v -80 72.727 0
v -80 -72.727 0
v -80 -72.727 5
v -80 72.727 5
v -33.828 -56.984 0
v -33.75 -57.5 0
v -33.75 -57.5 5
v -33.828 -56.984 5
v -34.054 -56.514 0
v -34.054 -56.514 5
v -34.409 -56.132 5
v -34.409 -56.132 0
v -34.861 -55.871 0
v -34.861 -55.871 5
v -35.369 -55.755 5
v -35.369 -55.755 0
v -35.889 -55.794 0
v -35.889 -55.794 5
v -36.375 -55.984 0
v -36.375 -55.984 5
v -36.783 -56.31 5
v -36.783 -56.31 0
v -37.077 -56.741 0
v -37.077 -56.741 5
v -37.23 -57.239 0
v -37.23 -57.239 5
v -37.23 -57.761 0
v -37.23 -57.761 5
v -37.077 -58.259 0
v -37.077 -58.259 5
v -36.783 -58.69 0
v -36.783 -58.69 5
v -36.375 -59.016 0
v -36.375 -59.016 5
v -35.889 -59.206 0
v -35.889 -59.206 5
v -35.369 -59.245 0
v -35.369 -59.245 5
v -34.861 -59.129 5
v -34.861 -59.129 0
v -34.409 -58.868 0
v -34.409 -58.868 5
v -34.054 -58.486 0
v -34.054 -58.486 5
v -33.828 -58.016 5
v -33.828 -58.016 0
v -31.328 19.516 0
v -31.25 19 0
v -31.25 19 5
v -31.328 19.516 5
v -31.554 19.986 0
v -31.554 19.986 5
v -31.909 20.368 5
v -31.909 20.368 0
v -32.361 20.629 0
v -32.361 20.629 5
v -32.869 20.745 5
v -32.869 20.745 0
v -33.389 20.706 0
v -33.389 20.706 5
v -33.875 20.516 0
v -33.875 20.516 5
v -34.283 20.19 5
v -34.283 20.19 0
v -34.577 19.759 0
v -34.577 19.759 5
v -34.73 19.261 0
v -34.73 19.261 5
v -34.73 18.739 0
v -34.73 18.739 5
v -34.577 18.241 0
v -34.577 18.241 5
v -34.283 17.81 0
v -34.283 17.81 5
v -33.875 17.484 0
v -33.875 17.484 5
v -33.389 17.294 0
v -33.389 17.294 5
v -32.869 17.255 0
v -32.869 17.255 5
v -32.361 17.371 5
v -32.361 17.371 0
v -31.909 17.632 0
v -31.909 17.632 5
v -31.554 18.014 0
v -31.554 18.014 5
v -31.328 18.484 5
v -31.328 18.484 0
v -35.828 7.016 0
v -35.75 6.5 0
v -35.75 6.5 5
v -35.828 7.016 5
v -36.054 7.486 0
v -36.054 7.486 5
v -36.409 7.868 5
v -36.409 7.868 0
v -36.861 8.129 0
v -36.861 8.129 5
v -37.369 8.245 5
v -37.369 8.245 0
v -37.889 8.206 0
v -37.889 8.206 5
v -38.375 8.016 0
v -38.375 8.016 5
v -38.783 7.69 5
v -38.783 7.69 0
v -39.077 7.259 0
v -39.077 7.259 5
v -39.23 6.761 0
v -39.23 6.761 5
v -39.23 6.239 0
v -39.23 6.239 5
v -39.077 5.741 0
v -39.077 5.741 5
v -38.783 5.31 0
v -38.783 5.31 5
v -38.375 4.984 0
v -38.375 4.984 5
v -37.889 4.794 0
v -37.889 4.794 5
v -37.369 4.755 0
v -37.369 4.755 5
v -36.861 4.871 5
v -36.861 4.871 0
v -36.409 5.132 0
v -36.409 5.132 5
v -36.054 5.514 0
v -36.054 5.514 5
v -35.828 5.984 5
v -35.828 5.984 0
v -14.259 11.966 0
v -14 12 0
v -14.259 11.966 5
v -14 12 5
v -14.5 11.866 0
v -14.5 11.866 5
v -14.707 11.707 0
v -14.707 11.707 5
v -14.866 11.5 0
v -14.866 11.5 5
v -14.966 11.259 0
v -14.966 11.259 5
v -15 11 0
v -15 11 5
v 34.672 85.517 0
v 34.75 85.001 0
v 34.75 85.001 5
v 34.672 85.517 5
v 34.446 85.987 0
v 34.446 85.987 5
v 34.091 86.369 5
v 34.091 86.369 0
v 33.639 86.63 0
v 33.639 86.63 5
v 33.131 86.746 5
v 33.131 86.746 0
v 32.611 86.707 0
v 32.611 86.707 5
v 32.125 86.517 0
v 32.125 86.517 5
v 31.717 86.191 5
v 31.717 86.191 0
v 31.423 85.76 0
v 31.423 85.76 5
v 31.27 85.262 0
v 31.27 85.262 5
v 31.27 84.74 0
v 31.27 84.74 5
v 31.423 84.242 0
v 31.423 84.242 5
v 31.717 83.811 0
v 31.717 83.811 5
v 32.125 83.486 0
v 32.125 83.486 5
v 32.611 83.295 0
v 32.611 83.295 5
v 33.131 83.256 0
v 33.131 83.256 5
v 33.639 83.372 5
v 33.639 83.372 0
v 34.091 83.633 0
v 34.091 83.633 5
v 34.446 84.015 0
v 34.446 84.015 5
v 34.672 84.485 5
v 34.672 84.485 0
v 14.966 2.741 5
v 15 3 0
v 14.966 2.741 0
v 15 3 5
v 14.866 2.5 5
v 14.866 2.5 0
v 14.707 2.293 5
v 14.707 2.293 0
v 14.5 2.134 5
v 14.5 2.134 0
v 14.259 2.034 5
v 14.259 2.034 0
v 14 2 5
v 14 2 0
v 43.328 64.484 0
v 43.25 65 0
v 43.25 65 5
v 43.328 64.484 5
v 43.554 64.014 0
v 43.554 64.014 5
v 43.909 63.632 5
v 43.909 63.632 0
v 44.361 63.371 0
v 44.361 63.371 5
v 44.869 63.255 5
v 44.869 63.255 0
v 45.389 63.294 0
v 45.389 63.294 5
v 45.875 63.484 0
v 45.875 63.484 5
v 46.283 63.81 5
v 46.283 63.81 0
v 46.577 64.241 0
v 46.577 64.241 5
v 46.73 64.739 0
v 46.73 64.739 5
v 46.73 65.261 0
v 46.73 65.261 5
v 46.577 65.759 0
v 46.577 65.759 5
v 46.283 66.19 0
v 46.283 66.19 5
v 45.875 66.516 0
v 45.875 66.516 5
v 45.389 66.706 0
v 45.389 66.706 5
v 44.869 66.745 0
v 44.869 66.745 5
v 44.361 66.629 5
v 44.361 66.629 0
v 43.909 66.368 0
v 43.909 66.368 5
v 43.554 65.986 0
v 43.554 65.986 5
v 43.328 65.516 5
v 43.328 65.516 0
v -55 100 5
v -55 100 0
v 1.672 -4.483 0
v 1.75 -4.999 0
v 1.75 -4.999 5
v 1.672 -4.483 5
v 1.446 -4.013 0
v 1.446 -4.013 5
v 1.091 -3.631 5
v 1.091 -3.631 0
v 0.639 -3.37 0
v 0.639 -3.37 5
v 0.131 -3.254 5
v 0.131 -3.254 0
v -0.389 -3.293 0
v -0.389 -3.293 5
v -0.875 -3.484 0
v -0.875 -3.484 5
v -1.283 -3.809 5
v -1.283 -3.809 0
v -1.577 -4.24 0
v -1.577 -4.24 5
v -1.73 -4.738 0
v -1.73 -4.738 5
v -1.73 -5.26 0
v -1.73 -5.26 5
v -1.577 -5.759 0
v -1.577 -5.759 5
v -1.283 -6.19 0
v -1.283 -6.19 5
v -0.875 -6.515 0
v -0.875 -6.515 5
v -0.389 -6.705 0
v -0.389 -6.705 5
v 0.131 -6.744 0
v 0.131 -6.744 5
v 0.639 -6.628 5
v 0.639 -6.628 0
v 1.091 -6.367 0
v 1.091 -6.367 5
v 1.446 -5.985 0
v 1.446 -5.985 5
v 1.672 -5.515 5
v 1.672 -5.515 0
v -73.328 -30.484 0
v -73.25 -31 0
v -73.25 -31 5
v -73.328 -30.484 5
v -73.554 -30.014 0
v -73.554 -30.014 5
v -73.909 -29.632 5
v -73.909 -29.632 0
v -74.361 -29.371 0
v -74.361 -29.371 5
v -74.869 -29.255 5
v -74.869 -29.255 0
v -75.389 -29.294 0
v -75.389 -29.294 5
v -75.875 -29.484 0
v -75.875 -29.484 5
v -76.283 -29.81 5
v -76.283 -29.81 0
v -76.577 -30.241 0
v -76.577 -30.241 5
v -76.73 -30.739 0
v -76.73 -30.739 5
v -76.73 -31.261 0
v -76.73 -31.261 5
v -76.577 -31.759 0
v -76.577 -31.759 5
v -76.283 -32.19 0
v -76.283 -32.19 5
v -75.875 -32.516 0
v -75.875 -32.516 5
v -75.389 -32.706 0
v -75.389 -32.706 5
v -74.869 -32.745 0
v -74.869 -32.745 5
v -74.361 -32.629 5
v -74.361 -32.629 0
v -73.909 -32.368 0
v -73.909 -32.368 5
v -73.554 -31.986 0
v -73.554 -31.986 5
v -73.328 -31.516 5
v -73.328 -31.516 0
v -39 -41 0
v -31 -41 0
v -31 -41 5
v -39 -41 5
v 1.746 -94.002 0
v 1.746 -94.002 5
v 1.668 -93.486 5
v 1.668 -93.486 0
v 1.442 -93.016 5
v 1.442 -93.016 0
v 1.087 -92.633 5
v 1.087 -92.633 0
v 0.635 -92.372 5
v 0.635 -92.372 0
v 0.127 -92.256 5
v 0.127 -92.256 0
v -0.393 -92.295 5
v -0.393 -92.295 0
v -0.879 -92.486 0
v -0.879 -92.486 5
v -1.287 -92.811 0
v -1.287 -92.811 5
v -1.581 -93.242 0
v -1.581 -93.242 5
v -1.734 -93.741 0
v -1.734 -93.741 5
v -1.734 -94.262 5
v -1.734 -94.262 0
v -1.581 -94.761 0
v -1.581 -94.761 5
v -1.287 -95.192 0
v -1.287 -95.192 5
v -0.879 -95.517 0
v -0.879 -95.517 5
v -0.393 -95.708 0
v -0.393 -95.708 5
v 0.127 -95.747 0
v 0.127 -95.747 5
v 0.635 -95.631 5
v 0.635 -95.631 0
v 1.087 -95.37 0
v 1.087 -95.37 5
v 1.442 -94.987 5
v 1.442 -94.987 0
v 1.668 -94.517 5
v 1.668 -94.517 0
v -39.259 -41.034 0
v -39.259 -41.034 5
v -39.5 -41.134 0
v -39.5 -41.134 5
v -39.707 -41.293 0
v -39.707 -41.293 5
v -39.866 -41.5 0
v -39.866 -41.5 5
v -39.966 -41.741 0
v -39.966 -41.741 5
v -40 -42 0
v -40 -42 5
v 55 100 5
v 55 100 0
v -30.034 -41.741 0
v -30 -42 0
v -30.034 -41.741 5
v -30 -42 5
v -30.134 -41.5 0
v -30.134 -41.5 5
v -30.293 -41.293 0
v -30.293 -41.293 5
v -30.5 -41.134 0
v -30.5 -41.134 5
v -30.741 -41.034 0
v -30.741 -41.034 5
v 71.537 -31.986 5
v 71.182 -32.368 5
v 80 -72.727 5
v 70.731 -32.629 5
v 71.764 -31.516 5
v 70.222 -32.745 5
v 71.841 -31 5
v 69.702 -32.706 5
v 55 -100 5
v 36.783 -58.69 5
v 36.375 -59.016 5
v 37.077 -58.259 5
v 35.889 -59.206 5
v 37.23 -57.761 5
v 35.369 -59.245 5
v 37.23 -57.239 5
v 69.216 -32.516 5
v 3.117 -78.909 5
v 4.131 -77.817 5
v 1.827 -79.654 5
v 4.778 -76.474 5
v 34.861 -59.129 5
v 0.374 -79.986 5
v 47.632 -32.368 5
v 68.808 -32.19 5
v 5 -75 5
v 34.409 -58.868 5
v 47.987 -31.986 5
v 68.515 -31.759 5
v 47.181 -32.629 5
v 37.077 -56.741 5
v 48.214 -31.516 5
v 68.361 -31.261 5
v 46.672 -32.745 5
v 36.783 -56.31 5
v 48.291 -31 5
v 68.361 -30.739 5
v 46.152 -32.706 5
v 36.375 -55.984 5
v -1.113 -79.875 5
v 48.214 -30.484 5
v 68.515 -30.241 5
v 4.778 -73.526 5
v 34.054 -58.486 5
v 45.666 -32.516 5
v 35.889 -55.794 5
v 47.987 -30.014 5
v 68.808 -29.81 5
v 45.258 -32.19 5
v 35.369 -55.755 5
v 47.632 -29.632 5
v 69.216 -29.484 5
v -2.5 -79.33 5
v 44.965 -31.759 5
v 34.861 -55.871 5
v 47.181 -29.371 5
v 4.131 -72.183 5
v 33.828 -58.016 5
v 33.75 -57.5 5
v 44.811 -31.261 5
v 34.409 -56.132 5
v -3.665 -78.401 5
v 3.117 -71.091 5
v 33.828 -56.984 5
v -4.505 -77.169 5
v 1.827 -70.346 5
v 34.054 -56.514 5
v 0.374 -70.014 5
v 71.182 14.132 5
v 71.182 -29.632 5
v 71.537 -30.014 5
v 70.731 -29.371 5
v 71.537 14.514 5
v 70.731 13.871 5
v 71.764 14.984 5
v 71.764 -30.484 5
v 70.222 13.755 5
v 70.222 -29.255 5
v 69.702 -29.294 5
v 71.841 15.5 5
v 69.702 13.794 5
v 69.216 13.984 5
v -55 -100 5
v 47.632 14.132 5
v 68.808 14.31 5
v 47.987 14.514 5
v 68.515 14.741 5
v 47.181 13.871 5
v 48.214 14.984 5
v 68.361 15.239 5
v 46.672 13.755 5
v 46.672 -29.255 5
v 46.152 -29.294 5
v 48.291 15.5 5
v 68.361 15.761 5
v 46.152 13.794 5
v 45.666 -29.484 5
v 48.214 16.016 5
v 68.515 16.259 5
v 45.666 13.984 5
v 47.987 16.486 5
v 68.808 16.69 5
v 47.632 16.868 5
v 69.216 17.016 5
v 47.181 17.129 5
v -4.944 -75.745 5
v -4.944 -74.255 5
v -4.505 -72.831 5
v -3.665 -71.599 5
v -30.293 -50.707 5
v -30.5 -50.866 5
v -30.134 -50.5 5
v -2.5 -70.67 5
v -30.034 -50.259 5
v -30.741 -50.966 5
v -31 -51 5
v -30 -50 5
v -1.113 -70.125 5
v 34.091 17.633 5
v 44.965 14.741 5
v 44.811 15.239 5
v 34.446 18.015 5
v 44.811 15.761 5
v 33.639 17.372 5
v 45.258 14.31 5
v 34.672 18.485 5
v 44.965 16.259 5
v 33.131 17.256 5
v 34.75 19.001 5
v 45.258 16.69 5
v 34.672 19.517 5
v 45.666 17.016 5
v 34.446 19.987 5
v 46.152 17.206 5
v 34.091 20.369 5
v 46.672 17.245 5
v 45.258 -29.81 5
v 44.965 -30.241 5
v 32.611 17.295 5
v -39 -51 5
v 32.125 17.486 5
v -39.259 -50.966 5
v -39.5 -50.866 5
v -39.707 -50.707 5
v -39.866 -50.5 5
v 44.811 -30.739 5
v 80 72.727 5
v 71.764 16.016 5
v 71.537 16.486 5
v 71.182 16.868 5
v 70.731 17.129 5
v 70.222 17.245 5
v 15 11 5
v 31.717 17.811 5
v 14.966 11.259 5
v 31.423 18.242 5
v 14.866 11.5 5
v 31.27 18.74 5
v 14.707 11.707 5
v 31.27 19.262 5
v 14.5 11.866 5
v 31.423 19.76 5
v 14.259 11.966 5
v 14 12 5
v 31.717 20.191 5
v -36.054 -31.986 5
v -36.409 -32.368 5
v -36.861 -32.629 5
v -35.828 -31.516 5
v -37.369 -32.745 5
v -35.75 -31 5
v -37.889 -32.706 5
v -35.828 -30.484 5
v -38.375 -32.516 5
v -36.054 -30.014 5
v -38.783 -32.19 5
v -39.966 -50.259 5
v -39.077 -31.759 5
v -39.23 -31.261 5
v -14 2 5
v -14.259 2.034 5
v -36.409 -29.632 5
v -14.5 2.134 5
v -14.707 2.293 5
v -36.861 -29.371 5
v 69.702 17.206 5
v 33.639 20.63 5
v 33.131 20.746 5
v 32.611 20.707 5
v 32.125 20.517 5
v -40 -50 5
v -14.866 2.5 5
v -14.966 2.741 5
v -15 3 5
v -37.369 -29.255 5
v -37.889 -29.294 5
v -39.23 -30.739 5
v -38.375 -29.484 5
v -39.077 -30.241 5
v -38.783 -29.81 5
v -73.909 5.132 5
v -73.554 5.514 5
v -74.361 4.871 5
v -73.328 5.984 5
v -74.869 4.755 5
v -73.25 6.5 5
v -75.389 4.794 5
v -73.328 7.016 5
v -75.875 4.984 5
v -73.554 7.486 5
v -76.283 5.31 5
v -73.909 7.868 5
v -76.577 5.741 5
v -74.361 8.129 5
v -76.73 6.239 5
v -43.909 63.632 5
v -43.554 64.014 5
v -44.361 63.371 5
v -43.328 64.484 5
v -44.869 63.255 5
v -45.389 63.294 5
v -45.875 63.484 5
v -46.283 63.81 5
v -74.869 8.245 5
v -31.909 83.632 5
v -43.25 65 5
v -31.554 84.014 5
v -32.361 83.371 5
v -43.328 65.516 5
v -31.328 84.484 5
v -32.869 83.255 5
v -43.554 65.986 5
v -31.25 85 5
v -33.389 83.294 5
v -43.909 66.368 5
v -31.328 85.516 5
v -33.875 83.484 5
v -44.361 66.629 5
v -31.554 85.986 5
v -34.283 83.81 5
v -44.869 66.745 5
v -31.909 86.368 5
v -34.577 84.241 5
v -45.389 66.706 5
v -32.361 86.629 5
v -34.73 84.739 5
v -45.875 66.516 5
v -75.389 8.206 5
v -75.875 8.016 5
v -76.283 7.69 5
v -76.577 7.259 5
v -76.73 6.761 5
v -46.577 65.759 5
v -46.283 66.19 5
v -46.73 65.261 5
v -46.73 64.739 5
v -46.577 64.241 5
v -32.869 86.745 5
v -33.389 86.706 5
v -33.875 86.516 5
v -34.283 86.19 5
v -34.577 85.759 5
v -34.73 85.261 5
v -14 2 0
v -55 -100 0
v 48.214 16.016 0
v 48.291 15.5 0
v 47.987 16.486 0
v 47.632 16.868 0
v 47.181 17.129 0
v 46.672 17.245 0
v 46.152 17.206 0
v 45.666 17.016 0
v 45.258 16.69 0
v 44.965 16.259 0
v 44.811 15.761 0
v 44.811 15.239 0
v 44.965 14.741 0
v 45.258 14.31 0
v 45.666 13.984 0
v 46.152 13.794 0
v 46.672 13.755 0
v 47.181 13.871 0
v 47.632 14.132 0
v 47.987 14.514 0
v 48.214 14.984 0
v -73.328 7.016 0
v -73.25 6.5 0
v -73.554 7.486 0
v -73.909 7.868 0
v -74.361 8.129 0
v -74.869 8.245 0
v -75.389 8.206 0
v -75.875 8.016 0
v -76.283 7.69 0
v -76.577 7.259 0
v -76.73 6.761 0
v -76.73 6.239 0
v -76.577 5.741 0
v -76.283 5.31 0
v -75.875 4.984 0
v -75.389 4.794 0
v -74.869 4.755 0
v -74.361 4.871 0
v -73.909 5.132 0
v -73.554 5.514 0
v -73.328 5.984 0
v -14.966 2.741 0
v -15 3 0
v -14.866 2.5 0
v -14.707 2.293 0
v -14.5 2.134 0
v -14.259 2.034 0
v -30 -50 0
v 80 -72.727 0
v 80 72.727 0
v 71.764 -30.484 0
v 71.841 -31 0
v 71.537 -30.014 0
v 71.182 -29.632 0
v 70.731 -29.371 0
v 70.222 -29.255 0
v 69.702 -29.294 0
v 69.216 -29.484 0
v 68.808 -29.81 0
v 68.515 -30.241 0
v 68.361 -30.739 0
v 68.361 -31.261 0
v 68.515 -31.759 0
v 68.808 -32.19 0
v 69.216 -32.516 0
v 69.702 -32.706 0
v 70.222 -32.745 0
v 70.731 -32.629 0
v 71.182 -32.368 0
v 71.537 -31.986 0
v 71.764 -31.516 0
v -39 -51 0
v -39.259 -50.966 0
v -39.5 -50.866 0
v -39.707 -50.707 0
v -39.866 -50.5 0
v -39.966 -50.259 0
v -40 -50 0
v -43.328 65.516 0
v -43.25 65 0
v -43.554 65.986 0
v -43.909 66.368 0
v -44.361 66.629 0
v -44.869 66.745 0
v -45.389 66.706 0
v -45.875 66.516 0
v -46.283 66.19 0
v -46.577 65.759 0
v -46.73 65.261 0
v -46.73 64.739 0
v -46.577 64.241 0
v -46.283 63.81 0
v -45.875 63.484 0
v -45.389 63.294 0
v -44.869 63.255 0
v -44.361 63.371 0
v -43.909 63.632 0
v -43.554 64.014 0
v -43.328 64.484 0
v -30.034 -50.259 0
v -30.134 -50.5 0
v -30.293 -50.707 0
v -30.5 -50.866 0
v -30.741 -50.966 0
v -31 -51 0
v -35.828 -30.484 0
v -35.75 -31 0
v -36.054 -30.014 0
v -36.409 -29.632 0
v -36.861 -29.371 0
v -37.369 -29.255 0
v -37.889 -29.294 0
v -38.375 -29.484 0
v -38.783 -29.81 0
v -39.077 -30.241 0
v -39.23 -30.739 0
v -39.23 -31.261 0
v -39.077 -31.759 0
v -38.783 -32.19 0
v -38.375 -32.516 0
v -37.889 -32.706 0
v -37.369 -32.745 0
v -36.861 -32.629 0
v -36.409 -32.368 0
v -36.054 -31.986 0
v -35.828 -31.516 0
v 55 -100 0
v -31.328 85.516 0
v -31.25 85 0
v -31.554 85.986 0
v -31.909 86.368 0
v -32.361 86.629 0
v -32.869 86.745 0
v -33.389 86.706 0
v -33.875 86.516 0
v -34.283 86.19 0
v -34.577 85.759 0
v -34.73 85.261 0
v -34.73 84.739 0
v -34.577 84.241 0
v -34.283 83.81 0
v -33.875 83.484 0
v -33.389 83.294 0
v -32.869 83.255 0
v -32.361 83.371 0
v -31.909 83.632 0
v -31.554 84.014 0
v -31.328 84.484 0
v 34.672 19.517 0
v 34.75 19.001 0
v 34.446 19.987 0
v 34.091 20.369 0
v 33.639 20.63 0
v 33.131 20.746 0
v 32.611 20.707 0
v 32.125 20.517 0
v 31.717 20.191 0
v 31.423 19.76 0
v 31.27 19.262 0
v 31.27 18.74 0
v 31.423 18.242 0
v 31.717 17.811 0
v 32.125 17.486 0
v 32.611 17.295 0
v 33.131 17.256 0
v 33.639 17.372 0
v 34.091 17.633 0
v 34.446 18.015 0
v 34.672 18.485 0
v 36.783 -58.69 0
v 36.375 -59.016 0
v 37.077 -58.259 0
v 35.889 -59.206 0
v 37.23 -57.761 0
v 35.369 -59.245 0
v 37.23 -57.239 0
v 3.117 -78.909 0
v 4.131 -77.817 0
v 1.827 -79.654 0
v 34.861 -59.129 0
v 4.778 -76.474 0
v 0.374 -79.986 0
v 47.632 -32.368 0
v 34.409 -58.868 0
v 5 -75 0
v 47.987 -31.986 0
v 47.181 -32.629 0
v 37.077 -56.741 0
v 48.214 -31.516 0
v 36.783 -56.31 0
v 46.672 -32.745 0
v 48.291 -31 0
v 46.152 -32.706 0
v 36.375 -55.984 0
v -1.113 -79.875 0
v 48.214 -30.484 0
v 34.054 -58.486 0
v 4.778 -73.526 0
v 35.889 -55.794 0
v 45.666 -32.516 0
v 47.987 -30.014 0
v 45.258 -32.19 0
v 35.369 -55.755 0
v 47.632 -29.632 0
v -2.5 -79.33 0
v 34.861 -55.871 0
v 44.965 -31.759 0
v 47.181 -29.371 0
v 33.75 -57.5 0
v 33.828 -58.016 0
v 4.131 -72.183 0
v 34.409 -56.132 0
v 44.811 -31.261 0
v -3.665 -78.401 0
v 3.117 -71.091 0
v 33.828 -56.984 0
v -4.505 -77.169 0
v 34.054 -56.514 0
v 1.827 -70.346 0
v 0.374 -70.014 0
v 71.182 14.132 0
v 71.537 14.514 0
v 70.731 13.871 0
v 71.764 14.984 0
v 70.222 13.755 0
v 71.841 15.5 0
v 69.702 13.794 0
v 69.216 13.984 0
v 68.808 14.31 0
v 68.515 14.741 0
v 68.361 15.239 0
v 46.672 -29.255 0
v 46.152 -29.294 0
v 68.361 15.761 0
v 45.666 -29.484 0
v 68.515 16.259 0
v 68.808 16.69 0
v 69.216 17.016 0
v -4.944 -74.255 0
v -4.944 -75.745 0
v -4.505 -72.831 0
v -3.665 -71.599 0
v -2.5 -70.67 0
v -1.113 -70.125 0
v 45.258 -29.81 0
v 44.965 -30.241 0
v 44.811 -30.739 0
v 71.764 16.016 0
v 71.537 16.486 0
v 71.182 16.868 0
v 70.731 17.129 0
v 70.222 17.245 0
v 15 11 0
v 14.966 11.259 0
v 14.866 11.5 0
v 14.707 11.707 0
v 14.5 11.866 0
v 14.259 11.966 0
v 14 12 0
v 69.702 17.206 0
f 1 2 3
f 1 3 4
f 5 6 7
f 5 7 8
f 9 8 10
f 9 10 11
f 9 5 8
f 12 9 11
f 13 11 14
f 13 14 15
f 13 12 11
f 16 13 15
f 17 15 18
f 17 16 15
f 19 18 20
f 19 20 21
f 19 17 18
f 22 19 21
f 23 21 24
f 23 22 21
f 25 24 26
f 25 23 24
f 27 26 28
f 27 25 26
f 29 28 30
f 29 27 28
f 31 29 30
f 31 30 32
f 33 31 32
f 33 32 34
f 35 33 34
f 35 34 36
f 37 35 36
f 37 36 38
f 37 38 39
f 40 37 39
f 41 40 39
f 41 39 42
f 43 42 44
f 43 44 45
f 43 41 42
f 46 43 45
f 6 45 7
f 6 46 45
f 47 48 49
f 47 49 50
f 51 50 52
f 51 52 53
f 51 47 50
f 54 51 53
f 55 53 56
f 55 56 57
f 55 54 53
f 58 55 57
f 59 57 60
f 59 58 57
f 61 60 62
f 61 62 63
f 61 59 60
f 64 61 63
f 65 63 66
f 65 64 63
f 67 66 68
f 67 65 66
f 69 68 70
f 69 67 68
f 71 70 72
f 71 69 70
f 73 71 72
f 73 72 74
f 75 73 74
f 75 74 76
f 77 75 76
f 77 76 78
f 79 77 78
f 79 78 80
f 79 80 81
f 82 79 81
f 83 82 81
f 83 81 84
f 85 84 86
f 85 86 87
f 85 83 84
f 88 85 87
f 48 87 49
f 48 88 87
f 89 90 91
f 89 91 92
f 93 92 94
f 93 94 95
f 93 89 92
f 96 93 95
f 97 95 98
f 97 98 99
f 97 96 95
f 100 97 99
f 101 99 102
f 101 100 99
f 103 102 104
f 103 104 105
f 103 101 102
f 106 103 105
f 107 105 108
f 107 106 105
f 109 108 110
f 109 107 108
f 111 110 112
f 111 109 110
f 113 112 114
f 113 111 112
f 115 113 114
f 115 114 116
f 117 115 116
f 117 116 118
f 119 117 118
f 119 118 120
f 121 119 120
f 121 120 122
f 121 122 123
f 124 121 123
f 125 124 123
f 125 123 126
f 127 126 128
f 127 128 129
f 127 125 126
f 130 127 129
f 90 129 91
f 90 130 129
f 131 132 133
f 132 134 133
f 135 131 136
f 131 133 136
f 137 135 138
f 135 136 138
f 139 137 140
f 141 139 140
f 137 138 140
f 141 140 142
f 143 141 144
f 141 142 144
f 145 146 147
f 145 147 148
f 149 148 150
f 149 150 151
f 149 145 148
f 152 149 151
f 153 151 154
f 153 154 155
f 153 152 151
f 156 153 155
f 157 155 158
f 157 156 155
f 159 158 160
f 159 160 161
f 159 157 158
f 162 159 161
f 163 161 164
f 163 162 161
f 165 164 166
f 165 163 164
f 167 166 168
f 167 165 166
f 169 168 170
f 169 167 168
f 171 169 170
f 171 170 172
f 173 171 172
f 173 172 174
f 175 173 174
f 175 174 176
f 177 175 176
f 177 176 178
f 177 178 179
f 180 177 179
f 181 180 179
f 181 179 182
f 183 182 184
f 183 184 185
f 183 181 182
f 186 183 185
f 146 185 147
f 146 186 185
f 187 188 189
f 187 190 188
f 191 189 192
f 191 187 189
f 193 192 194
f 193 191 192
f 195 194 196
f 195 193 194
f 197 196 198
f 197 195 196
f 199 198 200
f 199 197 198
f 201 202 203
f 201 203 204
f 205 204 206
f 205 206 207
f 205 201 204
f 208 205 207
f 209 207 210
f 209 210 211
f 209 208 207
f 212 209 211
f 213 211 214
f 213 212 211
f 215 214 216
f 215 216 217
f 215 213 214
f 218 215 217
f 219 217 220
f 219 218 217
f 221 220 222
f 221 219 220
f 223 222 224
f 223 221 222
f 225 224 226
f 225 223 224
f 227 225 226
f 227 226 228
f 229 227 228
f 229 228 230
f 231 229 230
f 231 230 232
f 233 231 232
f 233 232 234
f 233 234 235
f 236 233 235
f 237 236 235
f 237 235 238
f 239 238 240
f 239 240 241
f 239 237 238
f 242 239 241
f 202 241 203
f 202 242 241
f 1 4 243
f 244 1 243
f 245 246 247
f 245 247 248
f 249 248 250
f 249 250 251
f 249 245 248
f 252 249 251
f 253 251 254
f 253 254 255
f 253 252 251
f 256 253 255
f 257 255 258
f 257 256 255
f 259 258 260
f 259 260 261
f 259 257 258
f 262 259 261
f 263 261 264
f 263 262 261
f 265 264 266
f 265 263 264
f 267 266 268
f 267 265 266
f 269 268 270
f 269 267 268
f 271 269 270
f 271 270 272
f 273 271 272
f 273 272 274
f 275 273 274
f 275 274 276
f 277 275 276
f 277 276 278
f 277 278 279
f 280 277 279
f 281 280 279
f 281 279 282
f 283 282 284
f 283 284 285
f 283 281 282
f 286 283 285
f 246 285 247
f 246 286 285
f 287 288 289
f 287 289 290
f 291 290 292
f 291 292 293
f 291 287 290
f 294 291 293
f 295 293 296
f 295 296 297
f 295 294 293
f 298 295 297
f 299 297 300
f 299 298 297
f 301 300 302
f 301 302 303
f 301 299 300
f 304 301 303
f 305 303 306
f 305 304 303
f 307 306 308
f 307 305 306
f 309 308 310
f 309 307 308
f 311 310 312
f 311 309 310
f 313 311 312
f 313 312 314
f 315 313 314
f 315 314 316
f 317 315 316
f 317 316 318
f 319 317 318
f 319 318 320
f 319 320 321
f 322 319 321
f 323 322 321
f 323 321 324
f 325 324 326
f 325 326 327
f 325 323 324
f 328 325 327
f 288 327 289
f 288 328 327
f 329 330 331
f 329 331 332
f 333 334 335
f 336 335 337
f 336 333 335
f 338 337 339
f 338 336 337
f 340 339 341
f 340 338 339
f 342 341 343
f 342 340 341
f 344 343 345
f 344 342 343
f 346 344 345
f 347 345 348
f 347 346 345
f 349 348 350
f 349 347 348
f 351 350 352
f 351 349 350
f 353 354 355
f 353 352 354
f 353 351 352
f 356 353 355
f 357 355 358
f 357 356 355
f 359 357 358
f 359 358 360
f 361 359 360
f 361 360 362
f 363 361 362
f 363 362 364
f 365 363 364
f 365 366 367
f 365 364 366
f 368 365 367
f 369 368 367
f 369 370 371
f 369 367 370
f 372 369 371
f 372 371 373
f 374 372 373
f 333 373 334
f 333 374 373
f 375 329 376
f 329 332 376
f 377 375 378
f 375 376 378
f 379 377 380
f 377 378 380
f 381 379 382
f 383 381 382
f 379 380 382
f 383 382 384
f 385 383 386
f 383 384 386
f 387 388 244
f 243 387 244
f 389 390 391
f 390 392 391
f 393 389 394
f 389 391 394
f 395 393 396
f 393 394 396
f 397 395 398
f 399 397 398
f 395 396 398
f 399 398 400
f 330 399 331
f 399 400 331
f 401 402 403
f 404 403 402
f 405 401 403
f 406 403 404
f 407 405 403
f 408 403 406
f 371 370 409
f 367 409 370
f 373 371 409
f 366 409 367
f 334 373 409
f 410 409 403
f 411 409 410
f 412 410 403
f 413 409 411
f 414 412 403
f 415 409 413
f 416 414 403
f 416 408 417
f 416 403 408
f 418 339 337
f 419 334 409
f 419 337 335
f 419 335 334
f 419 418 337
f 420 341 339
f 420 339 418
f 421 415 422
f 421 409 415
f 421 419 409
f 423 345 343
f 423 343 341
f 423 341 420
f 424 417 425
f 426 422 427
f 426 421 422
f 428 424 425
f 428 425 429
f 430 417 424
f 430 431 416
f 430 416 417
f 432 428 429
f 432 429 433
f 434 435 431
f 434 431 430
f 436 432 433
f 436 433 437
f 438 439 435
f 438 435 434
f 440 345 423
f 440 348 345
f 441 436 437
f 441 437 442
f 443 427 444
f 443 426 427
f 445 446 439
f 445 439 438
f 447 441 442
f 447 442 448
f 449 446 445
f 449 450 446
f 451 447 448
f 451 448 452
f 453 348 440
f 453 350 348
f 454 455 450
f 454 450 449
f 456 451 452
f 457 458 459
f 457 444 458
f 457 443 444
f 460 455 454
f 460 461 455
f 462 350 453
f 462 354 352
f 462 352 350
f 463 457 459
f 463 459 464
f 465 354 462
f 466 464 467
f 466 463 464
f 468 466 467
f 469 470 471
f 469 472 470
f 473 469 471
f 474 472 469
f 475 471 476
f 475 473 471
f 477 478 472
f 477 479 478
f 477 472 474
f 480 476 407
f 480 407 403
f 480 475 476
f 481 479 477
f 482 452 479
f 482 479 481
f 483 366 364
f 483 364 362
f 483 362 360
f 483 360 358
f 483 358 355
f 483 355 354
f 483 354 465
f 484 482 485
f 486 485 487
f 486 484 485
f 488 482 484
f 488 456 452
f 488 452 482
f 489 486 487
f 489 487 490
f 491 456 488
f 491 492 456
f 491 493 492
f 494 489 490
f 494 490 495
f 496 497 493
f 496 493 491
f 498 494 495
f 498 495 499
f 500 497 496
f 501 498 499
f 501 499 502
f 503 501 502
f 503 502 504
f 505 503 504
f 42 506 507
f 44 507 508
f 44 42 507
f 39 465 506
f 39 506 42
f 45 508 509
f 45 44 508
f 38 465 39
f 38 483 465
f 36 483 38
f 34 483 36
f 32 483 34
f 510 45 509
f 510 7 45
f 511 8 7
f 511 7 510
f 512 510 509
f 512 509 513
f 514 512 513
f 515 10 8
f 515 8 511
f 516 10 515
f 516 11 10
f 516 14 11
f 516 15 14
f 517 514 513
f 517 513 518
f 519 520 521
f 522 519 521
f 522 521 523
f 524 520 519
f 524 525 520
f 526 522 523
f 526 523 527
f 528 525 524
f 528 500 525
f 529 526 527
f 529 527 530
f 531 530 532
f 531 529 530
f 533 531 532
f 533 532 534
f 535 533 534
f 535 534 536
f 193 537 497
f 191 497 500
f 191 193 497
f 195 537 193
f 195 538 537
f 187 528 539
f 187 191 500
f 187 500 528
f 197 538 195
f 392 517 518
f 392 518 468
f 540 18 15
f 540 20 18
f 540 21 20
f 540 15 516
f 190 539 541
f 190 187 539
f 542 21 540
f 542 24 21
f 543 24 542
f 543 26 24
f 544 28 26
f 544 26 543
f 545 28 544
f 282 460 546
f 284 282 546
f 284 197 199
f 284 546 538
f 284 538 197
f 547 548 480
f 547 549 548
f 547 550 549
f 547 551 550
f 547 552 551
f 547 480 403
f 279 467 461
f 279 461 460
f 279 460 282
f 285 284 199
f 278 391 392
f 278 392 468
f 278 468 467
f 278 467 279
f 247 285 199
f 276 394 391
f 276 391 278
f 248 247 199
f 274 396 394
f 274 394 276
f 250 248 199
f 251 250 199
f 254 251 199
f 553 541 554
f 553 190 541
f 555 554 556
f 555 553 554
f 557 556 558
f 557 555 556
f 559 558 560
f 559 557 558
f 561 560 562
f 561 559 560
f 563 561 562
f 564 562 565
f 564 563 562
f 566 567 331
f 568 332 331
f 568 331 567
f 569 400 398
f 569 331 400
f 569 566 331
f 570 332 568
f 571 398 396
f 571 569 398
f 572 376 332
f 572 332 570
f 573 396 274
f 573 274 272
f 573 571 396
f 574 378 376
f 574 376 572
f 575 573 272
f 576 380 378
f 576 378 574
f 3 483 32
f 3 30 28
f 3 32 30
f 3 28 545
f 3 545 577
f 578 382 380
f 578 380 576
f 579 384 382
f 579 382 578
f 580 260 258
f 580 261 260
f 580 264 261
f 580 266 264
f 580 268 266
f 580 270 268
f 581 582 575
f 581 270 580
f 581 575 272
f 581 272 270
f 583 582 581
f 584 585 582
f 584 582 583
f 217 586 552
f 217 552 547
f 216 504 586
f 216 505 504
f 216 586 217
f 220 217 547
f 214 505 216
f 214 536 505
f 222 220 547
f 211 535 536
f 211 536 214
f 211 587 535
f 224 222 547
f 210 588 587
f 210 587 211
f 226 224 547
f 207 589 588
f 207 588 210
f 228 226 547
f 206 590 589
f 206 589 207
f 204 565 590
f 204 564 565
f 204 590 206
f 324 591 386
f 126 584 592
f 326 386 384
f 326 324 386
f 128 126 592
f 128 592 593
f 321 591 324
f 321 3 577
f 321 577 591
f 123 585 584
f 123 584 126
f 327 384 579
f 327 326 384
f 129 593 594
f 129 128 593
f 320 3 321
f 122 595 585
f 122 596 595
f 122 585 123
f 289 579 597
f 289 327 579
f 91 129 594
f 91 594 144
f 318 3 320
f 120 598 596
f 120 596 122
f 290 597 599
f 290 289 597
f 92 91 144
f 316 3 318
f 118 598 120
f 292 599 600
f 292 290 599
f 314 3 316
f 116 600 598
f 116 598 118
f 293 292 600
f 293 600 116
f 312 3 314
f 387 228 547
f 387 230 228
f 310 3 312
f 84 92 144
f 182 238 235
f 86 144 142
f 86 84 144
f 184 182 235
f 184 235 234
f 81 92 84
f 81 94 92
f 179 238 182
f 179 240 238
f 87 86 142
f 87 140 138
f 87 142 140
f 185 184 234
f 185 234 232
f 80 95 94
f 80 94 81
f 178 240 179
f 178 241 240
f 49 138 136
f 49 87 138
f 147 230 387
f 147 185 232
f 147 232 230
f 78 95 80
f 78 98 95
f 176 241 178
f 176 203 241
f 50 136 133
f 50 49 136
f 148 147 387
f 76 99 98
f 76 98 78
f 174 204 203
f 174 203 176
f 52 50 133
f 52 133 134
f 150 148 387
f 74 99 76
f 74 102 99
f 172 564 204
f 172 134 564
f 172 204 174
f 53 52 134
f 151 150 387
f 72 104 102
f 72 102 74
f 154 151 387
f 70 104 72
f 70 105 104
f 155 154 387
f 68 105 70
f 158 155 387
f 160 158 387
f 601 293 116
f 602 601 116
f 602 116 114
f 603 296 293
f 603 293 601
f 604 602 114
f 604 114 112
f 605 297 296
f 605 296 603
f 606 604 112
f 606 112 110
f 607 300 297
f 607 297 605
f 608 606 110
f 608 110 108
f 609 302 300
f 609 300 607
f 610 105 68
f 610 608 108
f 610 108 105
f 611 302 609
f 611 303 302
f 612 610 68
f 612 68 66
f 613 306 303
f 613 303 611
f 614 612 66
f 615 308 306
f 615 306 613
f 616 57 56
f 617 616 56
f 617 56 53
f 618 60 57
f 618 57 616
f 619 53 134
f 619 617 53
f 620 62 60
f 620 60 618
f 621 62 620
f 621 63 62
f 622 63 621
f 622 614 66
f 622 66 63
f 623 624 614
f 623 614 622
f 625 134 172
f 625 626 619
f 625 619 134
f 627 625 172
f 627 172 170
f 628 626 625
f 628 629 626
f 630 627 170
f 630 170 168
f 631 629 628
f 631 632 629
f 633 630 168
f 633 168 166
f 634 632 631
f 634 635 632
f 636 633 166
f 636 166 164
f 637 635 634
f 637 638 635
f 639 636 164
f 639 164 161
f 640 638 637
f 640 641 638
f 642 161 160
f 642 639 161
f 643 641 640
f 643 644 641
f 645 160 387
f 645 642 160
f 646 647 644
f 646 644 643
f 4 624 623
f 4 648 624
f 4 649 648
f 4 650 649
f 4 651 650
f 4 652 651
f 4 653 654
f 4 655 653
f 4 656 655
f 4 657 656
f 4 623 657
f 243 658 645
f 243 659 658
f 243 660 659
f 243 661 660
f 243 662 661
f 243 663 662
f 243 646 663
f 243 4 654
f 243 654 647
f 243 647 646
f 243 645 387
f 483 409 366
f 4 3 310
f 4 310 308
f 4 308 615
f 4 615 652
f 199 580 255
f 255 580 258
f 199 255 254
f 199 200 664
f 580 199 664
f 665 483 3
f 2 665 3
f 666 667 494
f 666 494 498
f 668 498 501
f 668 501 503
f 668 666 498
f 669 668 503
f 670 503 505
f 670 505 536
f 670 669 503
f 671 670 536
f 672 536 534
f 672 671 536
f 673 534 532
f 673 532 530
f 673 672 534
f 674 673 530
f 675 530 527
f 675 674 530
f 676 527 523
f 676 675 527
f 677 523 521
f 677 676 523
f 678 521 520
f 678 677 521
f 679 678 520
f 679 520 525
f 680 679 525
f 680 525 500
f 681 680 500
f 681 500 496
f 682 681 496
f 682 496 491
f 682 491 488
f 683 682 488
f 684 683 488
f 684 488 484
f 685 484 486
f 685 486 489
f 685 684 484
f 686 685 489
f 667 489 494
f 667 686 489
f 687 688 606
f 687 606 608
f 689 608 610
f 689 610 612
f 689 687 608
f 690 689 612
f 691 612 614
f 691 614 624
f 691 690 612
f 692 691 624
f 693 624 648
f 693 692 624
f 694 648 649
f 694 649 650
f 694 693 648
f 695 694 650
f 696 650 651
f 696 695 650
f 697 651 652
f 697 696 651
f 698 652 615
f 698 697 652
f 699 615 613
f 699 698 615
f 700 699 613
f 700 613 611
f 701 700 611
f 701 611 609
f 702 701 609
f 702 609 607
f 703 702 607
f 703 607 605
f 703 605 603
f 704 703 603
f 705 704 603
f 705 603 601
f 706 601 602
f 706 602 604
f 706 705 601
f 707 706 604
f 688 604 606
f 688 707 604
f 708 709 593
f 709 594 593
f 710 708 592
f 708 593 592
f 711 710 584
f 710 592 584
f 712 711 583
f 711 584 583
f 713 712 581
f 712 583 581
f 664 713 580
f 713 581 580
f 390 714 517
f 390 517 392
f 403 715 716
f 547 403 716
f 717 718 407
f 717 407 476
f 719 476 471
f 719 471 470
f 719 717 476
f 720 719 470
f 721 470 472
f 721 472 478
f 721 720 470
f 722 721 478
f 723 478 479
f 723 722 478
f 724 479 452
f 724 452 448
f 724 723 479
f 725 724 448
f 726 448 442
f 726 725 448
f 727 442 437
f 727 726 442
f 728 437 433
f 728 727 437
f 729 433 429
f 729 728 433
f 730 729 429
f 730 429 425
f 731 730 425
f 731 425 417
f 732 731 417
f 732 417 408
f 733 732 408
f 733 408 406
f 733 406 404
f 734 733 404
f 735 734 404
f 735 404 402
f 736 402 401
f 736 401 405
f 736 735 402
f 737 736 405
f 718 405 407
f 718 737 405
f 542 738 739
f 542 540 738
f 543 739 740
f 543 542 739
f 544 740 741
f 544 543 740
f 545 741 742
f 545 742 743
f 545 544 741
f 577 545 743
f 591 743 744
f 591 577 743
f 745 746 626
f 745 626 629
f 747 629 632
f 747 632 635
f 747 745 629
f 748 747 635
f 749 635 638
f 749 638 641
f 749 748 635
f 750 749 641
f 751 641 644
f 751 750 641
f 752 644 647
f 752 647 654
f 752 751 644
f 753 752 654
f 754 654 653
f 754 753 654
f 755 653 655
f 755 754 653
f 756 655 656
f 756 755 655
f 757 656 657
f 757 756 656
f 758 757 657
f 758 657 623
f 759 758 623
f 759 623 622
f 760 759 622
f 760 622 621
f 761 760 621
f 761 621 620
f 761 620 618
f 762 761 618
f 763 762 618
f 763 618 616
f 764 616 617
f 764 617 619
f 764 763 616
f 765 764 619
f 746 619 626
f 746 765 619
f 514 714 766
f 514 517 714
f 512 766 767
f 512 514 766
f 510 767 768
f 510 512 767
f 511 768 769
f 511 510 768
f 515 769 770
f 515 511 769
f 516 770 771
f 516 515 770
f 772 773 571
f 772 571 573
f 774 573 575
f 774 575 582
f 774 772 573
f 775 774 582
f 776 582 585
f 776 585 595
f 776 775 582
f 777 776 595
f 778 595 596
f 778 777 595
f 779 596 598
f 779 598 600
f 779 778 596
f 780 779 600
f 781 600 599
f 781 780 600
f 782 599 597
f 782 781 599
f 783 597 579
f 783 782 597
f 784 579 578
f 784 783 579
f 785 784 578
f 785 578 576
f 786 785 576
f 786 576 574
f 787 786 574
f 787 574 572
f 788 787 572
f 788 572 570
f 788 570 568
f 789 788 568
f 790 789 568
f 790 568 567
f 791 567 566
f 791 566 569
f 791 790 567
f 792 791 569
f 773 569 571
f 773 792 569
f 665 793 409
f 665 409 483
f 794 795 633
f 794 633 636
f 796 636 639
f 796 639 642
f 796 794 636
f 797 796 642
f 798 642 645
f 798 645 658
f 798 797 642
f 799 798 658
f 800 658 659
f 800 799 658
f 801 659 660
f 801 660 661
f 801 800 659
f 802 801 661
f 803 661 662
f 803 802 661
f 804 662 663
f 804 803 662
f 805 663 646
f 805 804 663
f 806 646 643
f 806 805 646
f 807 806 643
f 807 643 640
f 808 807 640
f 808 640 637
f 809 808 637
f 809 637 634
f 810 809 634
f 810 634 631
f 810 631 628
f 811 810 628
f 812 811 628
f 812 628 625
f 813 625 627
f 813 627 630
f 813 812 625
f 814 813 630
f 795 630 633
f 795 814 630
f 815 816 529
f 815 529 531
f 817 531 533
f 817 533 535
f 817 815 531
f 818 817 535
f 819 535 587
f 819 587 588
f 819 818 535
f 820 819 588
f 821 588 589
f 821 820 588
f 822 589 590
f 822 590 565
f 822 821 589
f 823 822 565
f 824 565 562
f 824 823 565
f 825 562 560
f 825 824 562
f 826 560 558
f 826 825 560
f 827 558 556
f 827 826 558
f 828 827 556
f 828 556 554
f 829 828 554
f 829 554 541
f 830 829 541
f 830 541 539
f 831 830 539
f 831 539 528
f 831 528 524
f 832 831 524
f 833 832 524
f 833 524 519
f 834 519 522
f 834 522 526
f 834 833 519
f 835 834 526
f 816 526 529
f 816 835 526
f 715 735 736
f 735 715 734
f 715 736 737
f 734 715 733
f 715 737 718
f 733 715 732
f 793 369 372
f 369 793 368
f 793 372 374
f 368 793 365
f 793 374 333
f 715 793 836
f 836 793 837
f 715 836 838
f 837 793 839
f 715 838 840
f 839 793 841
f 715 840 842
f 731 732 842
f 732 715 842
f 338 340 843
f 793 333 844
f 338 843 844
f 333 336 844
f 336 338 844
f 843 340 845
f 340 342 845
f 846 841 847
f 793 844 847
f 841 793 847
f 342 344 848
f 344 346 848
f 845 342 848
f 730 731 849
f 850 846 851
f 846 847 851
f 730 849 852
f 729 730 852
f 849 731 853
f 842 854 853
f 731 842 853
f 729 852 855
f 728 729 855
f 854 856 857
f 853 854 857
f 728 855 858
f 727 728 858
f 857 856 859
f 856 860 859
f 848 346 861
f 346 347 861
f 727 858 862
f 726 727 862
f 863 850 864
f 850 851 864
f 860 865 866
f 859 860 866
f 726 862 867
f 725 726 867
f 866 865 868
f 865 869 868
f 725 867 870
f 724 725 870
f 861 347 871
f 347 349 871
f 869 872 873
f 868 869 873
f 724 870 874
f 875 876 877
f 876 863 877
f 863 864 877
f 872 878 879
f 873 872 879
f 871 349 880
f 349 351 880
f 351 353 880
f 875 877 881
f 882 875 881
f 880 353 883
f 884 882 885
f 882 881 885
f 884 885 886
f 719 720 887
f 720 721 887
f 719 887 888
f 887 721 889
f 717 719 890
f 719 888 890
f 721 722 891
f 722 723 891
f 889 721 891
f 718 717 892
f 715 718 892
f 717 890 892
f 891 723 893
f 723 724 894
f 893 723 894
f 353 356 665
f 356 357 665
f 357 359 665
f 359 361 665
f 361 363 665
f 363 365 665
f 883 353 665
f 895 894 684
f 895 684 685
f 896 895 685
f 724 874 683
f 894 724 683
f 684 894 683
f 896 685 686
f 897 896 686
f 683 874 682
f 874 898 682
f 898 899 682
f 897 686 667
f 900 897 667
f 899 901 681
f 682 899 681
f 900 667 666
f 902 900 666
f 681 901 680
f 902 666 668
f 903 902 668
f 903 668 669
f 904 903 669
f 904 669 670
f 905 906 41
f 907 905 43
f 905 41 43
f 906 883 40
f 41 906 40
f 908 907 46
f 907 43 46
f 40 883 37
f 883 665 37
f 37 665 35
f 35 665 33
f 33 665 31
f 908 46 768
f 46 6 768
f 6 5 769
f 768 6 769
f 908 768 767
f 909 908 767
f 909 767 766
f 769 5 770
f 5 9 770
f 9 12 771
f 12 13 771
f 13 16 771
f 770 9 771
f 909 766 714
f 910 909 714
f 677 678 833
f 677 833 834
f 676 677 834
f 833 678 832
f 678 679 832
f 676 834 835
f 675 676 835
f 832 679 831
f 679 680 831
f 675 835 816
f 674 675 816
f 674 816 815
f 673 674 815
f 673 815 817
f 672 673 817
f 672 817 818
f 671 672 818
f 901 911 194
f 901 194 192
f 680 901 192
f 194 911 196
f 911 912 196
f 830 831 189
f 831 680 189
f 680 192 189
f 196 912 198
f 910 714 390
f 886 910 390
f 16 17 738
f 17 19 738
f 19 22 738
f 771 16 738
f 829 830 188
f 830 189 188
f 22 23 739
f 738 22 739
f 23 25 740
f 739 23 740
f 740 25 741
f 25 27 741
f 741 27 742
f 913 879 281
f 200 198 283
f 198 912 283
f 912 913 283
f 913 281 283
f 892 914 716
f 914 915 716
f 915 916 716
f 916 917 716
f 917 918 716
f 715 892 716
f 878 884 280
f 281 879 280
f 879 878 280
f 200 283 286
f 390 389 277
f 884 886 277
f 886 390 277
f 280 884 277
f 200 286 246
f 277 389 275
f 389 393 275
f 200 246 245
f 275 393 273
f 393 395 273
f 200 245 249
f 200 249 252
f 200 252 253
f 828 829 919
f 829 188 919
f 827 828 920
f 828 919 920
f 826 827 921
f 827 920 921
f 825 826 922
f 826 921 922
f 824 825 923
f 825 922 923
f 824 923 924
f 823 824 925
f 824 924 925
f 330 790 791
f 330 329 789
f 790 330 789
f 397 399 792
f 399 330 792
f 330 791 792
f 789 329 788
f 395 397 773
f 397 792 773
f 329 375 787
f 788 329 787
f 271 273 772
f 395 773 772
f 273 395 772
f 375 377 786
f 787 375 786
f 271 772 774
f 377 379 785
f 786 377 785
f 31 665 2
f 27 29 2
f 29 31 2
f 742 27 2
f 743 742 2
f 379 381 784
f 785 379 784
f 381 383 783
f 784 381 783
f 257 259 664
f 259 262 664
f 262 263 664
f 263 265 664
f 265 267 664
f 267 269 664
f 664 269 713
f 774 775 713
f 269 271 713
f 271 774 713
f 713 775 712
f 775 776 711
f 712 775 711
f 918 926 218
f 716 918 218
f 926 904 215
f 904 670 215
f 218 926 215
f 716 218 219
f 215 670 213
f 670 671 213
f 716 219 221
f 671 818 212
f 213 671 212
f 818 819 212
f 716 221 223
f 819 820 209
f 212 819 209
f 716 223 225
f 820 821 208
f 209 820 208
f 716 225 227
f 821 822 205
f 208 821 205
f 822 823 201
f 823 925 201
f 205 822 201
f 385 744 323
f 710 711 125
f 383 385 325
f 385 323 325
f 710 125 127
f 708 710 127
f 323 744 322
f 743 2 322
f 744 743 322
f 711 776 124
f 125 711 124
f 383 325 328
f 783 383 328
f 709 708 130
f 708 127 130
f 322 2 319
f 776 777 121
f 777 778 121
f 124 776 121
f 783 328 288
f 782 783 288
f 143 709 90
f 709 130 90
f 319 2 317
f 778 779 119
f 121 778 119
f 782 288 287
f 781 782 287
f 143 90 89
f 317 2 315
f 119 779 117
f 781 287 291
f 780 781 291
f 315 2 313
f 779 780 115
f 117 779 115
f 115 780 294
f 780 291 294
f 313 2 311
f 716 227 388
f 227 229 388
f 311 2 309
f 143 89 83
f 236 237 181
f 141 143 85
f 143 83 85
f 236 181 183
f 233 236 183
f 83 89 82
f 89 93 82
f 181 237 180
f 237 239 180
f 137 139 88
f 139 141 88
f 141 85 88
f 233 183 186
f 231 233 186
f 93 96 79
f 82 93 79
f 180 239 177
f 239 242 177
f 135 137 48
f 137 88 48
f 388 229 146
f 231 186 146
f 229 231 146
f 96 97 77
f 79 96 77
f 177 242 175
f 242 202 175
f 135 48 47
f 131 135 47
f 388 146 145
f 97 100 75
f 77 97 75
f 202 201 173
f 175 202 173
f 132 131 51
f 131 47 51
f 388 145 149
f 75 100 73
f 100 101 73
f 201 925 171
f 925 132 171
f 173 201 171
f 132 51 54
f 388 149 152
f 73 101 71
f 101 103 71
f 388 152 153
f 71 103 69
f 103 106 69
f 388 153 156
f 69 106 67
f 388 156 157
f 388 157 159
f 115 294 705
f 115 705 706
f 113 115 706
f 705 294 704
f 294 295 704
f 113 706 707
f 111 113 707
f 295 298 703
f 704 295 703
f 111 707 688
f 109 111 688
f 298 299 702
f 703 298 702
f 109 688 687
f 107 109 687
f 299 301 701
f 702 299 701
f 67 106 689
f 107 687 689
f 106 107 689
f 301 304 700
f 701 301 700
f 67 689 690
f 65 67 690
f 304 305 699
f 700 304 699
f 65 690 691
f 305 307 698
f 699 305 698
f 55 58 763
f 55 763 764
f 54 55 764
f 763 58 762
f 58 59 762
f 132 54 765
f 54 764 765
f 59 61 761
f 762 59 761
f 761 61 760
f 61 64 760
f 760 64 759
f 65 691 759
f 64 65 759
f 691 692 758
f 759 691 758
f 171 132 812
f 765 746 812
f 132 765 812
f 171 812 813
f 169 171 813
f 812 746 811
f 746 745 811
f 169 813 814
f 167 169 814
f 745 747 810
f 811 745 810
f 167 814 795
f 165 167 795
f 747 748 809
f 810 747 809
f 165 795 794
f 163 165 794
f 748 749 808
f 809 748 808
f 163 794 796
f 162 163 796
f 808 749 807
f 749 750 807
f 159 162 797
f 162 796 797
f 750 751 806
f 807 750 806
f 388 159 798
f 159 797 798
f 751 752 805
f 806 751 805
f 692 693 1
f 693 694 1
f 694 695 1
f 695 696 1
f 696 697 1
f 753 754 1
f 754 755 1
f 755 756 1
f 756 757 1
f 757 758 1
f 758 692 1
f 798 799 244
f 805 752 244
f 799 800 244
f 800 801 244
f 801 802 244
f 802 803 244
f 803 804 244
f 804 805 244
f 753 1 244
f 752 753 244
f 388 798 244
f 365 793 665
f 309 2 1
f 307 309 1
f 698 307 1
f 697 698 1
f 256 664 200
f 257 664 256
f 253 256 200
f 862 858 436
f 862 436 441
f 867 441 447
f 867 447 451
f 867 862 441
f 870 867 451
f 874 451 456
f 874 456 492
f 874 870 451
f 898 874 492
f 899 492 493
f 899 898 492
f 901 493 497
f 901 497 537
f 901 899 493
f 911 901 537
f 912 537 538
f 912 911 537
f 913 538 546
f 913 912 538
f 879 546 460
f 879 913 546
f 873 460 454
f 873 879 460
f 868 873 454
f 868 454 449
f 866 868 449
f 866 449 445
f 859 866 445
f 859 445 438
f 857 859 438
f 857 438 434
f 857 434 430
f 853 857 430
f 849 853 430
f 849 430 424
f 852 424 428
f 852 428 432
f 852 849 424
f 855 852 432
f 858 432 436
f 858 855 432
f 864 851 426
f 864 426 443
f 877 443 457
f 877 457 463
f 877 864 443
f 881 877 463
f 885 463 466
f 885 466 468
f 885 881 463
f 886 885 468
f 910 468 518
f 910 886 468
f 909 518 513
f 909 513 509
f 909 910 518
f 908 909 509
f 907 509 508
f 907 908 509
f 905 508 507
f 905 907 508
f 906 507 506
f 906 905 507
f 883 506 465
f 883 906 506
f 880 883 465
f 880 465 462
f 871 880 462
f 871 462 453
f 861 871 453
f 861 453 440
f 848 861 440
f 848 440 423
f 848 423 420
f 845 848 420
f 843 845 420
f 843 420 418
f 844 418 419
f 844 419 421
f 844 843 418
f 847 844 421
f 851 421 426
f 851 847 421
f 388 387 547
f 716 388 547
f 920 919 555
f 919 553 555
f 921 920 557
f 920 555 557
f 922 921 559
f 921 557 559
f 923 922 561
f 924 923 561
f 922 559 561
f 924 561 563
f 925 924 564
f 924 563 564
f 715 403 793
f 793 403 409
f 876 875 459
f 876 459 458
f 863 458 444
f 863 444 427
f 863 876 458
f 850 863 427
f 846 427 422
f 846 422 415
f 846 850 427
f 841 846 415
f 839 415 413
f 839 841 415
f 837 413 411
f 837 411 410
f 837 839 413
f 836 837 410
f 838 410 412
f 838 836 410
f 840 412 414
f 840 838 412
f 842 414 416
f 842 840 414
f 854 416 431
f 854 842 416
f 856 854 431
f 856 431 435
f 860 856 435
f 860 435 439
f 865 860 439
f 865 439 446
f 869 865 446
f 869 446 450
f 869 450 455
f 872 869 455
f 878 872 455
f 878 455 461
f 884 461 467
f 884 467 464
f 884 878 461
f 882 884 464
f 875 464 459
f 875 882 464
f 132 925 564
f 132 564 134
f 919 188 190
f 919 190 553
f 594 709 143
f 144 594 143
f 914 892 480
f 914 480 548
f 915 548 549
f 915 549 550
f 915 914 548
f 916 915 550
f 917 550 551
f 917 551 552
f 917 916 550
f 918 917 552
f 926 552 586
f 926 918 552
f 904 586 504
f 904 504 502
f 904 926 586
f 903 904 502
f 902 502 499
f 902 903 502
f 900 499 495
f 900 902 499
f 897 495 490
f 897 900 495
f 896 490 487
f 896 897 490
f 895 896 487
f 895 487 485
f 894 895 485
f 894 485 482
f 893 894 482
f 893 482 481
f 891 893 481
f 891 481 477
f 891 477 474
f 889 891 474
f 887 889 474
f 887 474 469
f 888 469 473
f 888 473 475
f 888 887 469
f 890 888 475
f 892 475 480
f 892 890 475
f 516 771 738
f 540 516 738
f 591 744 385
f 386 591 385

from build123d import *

# Parameters (mm, degrees)
ESQUISSE1_W               = 200
ESQUISSE1_H               = 160
ESQUISSE1_R               = 5
ESQUISSE1_R_2             = 1.75
ESQUISSE1_W_2             = 10
ESQUISSE1_H_2             = 10
ESQUISSE1_H_3             = 30
BOSS_EXTRU_1_DEPTH        = 5
CONG_2_R                  = 1
ENL_V_MAT_EXTRU_1_DEPTH   = 129.16005618
ESQUISSE3_R               = 1.75
TROU_CUVE_DIRECTION_DEPTH = 129.16005618


with BuildPart() as part:
    # Esquisse1 → Boss.-Extru.1 (new body)
    with BuildSketch(Plane(origin=(0, 0, 0), x_dir=(0, 1, 0), z_dir=(0, 0, 1))):
        Rectangle(ESQUISSE1_W, ESQUISSE1_H)
        with Locations(Location((-75, 0, 0), (0, 0, 270))):
            Circle(ESQUISSE1_R, mode=Mode.SUBTRACT)
        with Locations(Location((-57.5, 35.5, 0), (0, 0, 270))):
            Circle(ESQUISSE1_R_2, mode=Mode.SUBTRACT)
        with Locations(Location((-57.5, -35.5, 0), (0, 0, 90))):
            Circle(ESQUISSE1_R_2, mode=Mode.SUBTRACT)
        with Locations(Location((65, 45, 0), (0, 0, 270))):
            Circle(ESQUISSE1_R_2, mode=Mode.SUBTRACT)
        with Locations(Location((65, -45, 0), (0, 0, 90))):
            Circle(ESQUISSE1_R_2, mode=Mode.SUBTRACT)
        with Locations(Location((-31, 37.5, 0), (0, 0, 270))):
            Circle(ESQUISSE1_R_2, mode=Mode.SUBTRACT)
        with Locations(Location((-31, 75, 0), (0, 0, 270))):
            Circle(ESQUISSE1_R_2, mode=Mode.SUBTRACT)
        with Locations(Location((6.5, 75, 0), (0, 0, 270))):
            Circle(ESQUISSE1_R_2, mode=Mode.SUBTRACT)
        with Locations(Location((6.5, 37.5, 0), (0, 0, 270))):
            Circle(ESQUISSE1_R_2, mode=Mode.SUBTRACT)
        with Locations(Location((-31, -46.541307377, 0), (0, 0, 270))):
            Circle(ESQUISSE1_R_2, mode=Mode.SUBTRACT)
        with Locations(Location((-31, -70.091307377, 0), (0, 0, 270))):
            Circle(ESQUISSE1_R_2, mode=Mode.SUBTRACT)
        with Locations(Location((15.5, -46.541307377, 0), (0, 0, 270))):
            Circle(ESQUISSE1_R_2, mode=Mode.SUBTRACT)
        with Locations(Location((15.5, -70.091307377, 0), (0, 0, 270))):
            Circle(ESQUISSE1_R_2, mode=Mode.SUBTRACT)
        with Locations(Location((-4.999283545, 0, 0), (0, 0, 270))):
            Circle(ESQUISSE1_R_2, mode=Mode.SUBTRACT)
        with Locations(Location((85, 33, 0), (0, 0, 270))):
            Circle(ESQUISSE1_R_2, mode=Mode.SUBTRACT)
        with Locations(Location((85.001189598, -32.999999989, 0), (0, 0, 270))):
            Circle(ESQUISSE1_R_2, mode=Mode.SUBTRACT)
        with Locations(Location((19, 33, 0), (0, 0, 270))):
            Circle(ESQUISSE1_R_2, mode=Mode.SUBTRACT)
        with Locations(Location((19.001189598, -32.999999989, 0), (0, 0, 270))):
            Circle(ESQUISSE1_R_2, mode=Mode.SUBTRACT)
        with Locations((-46, 35)):
            Rectangle(ESQUISSE1_W_2, ESQUISSE1_H_2, mode=Mode.SUBTRACT)
        with Locations((7, 0)):
            Rectangle(ESQUISSE1_W_2, ESQUISSE1_H_3, mode=Mode.SUBTRACT)
    extrude(amount=BOSS_EXTRU_1_DEPTH)

    # Congé2
    cong_2_edges = [part.edges().sort_by_distance(p)[0] for p in [
        (-40, -51, 2.5),
        (-30, -51, 2.5),
        (-30, -41, 2.5),
        (-40, -41, 2.5),
        (-15, 2, 2.5),
        (15, 2, 2.5),
        (15, 12, 2.5),
        (-15, 12, 2.5),
    ]]
    fillet(cong_2_edges, radius=CONG_2_R)

    # Esquisse2 → Enlèv. mat.-Extru.1 (cut, through all)
    with BuildSketch(Plane.XY.offset(5)):
        Polygon((-573.580399643, 598.167108478), (-698.698151963, -488.082468479), (684.299979338, -647.380682556), (762.904681953, 702.431902078), align=None)
        Polygon((-110, 40), (0, 160), (110, 40), (110, -40), (0, -160), (-110, -40), align=None, mode=Mode.SUBTRACT)
    extrude(amount=-ENL_V_MAT_EXTRU_1_DEPTH, mode=Mode.SUBTRACT)

    # Esquisse3 → Trou cuve direction (cut, through all)
    with BuildSketch(Plane(origin=(0, 0, 0), x_dir=(0, 1, 0), z_dir=(0, 0, 1))):
        with Locations(Location((-94.001515359, 0.004041019, 0), (0, 0, 270))):
            Circle(ESQUISSE3_R)
    extrude(amount=TROU_CUVE_DIRECTION_DEPTH, mode=Mode.SUBTRACT)


solid = part.part
